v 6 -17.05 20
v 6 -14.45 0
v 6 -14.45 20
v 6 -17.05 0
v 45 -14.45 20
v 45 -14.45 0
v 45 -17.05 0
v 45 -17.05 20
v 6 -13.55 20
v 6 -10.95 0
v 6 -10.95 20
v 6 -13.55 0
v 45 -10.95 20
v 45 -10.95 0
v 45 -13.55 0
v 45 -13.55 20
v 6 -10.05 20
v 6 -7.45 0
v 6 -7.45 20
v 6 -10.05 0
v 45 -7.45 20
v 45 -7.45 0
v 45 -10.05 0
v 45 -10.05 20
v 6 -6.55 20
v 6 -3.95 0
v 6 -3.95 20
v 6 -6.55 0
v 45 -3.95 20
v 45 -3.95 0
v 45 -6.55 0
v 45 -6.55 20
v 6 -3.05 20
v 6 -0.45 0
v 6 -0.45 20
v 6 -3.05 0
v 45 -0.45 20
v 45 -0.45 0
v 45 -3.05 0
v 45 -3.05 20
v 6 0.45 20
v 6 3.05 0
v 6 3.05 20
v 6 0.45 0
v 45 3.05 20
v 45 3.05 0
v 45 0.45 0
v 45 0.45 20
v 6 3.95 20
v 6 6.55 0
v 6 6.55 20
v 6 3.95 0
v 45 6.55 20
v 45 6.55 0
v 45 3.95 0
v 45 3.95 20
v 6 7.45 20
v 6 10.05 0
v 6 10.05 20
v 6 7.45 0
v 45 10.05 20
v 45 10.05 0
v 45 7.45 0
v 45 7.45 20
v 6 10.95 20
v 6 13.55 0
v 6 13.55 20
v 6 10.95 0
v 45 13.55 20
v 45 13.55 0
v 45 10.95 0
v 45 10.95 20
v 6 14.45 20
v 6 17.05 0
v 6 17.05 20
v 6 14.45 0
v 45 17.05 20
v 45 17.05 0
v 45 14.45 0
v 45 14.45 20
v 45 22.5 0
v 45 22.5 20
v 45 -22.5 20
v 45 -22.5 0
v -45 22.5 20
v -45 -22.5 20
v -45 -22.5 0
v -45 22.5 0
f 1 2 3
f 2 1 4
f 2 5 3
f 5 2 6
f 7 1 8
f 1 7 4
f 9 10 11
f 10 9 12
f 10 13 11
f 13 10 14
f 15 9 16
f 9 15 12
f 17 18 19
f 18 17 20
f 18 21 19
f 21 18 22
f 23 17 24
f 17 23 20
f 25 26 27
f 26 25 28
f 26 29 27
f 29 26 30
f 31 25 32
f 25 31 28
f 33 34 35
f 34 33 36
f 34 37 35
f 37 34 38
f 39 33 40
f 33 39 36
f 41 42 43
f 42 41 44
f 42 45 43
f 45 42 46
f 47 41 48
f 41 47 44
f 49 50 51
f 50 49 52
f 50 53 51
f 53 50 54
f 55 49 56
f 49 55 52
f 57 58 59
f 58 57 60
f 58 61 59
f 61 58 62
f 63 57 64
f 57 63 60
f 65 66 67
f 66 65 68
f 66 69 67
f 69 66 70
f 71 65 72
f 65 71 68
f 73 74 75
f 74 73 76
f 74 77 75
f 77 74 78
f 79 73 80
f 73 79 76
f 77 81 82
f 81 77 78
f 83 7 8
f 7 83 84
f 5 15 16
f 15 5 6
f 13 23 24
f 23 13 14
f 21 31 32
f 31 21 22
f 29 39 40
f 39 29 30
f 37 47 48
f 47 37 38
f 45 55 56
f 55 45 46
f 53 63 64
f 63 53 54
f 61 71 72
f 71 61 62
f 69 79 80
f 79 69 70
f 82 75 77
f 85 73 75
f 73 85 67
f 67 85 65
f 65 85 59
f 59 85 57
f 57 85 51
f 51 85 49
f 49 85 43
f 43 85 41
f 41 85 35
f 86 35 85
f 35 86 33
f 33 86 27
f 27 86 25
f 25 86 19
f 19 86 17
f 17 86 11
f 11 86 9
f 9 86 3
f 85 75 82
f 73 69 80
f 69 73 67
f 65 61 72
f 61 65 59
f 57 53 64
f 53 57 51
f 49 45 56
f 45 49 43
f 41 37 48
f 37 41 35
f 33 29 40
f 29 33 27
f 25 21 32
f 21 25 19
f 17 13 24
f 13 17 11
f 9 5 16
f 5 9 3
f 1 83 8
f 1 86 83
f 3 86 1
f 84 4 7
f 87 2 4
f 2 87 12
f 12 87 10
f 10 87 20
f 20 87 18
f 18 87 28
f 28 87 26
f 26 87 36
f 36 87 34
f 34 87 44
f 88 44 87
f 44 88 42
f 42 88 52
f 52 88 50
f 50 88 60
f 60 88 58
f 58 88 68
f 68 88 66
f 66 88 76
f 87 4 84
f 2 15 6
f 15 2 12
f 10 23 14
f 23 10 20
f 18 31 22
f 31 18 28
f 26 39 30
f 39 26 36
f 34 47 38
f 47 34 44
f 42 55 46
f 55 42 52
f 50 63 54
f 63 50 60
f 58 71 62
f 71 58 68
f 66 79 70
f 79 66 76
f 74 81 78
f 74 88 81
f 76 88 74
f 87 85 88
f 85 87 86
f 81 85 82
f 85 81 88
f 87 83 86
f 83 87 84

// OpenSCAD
// Drying rack for 10 microscope slides
// Base block: 90 x 45 x 20 mm
// 10 slots: 77 mm long (X), 1.6 mm wide (Y), 10 mm deep, 3.5 mm pitch

// Base block dimensions
BLOCK_X = 90;
BLOCK_Y = 45;
BLOCK_Z = 20;

// Slot dimensions
SLOT_LENGTH = 77;
SLOT_WIDTH = 1.6;
SLOT_DEPTH = 10;

// Slot spacing
SLOT_PITCH = 3.5;
NUM_SLOTS = 10;

// Calculate slot group width and offset
SLOT_GROUP_WIDTH = (NUM_SLOTS - 1) * SLOT_PITCH;
SLOT_Y_OFFSET = SLOT_GROUP_WIDTH / 2;

// Slot X offset to centre the 77 mm slot in the 90 mm block
SLOT_X_OFFSET = (BLOCK_X - SLOT_LENGTH) / 2;

// Slot Y positions (centred on block)
SLOT_Y_START = -SLOT_Y_OFFSET;

// Cutting shape extension to avoid coplanar faces
EXTEND = 0.5;

module base_block() {
    // Centre the block on the origin in X and Y
    translate([-BLOCK_X / 2, -BLOCK_Y / 2, 0]) {
        cube([BLOCK_X, BLOCK_Y, BLOCK_Z], center = false);
    }
}

module slot_cut(slot_y_pos) {
    // Slot extends slightly past the top face (z=20) and bottom of cut (z=10)
    // Slot is centred in X, positioned at specific Y
    translate([
        SLOT_X_OFFSET - EXTEND,
        slot_y_pos - SLOT_WIDTH / 2 - EXTEND,
        -EXTEND
    ]) {
        cube([
            SLOT_LENGTH + 2 * EXTEND,
            SLOT_WIDTH + 2 * EXTEND,
            SLOT_DEPTH + BLOCK_Z + 2 * EXTEND
        ], center = false);
    }
}

// Build the rack: base block with slots cut out
difference() {
    base_block();
    
    for (i = [0 : NUM_SLOTS - 1]) {
        slot_y = SLOT_Y_START + i * SLOT_PITCH;
        slot_cut(slot_y);
    }
}
